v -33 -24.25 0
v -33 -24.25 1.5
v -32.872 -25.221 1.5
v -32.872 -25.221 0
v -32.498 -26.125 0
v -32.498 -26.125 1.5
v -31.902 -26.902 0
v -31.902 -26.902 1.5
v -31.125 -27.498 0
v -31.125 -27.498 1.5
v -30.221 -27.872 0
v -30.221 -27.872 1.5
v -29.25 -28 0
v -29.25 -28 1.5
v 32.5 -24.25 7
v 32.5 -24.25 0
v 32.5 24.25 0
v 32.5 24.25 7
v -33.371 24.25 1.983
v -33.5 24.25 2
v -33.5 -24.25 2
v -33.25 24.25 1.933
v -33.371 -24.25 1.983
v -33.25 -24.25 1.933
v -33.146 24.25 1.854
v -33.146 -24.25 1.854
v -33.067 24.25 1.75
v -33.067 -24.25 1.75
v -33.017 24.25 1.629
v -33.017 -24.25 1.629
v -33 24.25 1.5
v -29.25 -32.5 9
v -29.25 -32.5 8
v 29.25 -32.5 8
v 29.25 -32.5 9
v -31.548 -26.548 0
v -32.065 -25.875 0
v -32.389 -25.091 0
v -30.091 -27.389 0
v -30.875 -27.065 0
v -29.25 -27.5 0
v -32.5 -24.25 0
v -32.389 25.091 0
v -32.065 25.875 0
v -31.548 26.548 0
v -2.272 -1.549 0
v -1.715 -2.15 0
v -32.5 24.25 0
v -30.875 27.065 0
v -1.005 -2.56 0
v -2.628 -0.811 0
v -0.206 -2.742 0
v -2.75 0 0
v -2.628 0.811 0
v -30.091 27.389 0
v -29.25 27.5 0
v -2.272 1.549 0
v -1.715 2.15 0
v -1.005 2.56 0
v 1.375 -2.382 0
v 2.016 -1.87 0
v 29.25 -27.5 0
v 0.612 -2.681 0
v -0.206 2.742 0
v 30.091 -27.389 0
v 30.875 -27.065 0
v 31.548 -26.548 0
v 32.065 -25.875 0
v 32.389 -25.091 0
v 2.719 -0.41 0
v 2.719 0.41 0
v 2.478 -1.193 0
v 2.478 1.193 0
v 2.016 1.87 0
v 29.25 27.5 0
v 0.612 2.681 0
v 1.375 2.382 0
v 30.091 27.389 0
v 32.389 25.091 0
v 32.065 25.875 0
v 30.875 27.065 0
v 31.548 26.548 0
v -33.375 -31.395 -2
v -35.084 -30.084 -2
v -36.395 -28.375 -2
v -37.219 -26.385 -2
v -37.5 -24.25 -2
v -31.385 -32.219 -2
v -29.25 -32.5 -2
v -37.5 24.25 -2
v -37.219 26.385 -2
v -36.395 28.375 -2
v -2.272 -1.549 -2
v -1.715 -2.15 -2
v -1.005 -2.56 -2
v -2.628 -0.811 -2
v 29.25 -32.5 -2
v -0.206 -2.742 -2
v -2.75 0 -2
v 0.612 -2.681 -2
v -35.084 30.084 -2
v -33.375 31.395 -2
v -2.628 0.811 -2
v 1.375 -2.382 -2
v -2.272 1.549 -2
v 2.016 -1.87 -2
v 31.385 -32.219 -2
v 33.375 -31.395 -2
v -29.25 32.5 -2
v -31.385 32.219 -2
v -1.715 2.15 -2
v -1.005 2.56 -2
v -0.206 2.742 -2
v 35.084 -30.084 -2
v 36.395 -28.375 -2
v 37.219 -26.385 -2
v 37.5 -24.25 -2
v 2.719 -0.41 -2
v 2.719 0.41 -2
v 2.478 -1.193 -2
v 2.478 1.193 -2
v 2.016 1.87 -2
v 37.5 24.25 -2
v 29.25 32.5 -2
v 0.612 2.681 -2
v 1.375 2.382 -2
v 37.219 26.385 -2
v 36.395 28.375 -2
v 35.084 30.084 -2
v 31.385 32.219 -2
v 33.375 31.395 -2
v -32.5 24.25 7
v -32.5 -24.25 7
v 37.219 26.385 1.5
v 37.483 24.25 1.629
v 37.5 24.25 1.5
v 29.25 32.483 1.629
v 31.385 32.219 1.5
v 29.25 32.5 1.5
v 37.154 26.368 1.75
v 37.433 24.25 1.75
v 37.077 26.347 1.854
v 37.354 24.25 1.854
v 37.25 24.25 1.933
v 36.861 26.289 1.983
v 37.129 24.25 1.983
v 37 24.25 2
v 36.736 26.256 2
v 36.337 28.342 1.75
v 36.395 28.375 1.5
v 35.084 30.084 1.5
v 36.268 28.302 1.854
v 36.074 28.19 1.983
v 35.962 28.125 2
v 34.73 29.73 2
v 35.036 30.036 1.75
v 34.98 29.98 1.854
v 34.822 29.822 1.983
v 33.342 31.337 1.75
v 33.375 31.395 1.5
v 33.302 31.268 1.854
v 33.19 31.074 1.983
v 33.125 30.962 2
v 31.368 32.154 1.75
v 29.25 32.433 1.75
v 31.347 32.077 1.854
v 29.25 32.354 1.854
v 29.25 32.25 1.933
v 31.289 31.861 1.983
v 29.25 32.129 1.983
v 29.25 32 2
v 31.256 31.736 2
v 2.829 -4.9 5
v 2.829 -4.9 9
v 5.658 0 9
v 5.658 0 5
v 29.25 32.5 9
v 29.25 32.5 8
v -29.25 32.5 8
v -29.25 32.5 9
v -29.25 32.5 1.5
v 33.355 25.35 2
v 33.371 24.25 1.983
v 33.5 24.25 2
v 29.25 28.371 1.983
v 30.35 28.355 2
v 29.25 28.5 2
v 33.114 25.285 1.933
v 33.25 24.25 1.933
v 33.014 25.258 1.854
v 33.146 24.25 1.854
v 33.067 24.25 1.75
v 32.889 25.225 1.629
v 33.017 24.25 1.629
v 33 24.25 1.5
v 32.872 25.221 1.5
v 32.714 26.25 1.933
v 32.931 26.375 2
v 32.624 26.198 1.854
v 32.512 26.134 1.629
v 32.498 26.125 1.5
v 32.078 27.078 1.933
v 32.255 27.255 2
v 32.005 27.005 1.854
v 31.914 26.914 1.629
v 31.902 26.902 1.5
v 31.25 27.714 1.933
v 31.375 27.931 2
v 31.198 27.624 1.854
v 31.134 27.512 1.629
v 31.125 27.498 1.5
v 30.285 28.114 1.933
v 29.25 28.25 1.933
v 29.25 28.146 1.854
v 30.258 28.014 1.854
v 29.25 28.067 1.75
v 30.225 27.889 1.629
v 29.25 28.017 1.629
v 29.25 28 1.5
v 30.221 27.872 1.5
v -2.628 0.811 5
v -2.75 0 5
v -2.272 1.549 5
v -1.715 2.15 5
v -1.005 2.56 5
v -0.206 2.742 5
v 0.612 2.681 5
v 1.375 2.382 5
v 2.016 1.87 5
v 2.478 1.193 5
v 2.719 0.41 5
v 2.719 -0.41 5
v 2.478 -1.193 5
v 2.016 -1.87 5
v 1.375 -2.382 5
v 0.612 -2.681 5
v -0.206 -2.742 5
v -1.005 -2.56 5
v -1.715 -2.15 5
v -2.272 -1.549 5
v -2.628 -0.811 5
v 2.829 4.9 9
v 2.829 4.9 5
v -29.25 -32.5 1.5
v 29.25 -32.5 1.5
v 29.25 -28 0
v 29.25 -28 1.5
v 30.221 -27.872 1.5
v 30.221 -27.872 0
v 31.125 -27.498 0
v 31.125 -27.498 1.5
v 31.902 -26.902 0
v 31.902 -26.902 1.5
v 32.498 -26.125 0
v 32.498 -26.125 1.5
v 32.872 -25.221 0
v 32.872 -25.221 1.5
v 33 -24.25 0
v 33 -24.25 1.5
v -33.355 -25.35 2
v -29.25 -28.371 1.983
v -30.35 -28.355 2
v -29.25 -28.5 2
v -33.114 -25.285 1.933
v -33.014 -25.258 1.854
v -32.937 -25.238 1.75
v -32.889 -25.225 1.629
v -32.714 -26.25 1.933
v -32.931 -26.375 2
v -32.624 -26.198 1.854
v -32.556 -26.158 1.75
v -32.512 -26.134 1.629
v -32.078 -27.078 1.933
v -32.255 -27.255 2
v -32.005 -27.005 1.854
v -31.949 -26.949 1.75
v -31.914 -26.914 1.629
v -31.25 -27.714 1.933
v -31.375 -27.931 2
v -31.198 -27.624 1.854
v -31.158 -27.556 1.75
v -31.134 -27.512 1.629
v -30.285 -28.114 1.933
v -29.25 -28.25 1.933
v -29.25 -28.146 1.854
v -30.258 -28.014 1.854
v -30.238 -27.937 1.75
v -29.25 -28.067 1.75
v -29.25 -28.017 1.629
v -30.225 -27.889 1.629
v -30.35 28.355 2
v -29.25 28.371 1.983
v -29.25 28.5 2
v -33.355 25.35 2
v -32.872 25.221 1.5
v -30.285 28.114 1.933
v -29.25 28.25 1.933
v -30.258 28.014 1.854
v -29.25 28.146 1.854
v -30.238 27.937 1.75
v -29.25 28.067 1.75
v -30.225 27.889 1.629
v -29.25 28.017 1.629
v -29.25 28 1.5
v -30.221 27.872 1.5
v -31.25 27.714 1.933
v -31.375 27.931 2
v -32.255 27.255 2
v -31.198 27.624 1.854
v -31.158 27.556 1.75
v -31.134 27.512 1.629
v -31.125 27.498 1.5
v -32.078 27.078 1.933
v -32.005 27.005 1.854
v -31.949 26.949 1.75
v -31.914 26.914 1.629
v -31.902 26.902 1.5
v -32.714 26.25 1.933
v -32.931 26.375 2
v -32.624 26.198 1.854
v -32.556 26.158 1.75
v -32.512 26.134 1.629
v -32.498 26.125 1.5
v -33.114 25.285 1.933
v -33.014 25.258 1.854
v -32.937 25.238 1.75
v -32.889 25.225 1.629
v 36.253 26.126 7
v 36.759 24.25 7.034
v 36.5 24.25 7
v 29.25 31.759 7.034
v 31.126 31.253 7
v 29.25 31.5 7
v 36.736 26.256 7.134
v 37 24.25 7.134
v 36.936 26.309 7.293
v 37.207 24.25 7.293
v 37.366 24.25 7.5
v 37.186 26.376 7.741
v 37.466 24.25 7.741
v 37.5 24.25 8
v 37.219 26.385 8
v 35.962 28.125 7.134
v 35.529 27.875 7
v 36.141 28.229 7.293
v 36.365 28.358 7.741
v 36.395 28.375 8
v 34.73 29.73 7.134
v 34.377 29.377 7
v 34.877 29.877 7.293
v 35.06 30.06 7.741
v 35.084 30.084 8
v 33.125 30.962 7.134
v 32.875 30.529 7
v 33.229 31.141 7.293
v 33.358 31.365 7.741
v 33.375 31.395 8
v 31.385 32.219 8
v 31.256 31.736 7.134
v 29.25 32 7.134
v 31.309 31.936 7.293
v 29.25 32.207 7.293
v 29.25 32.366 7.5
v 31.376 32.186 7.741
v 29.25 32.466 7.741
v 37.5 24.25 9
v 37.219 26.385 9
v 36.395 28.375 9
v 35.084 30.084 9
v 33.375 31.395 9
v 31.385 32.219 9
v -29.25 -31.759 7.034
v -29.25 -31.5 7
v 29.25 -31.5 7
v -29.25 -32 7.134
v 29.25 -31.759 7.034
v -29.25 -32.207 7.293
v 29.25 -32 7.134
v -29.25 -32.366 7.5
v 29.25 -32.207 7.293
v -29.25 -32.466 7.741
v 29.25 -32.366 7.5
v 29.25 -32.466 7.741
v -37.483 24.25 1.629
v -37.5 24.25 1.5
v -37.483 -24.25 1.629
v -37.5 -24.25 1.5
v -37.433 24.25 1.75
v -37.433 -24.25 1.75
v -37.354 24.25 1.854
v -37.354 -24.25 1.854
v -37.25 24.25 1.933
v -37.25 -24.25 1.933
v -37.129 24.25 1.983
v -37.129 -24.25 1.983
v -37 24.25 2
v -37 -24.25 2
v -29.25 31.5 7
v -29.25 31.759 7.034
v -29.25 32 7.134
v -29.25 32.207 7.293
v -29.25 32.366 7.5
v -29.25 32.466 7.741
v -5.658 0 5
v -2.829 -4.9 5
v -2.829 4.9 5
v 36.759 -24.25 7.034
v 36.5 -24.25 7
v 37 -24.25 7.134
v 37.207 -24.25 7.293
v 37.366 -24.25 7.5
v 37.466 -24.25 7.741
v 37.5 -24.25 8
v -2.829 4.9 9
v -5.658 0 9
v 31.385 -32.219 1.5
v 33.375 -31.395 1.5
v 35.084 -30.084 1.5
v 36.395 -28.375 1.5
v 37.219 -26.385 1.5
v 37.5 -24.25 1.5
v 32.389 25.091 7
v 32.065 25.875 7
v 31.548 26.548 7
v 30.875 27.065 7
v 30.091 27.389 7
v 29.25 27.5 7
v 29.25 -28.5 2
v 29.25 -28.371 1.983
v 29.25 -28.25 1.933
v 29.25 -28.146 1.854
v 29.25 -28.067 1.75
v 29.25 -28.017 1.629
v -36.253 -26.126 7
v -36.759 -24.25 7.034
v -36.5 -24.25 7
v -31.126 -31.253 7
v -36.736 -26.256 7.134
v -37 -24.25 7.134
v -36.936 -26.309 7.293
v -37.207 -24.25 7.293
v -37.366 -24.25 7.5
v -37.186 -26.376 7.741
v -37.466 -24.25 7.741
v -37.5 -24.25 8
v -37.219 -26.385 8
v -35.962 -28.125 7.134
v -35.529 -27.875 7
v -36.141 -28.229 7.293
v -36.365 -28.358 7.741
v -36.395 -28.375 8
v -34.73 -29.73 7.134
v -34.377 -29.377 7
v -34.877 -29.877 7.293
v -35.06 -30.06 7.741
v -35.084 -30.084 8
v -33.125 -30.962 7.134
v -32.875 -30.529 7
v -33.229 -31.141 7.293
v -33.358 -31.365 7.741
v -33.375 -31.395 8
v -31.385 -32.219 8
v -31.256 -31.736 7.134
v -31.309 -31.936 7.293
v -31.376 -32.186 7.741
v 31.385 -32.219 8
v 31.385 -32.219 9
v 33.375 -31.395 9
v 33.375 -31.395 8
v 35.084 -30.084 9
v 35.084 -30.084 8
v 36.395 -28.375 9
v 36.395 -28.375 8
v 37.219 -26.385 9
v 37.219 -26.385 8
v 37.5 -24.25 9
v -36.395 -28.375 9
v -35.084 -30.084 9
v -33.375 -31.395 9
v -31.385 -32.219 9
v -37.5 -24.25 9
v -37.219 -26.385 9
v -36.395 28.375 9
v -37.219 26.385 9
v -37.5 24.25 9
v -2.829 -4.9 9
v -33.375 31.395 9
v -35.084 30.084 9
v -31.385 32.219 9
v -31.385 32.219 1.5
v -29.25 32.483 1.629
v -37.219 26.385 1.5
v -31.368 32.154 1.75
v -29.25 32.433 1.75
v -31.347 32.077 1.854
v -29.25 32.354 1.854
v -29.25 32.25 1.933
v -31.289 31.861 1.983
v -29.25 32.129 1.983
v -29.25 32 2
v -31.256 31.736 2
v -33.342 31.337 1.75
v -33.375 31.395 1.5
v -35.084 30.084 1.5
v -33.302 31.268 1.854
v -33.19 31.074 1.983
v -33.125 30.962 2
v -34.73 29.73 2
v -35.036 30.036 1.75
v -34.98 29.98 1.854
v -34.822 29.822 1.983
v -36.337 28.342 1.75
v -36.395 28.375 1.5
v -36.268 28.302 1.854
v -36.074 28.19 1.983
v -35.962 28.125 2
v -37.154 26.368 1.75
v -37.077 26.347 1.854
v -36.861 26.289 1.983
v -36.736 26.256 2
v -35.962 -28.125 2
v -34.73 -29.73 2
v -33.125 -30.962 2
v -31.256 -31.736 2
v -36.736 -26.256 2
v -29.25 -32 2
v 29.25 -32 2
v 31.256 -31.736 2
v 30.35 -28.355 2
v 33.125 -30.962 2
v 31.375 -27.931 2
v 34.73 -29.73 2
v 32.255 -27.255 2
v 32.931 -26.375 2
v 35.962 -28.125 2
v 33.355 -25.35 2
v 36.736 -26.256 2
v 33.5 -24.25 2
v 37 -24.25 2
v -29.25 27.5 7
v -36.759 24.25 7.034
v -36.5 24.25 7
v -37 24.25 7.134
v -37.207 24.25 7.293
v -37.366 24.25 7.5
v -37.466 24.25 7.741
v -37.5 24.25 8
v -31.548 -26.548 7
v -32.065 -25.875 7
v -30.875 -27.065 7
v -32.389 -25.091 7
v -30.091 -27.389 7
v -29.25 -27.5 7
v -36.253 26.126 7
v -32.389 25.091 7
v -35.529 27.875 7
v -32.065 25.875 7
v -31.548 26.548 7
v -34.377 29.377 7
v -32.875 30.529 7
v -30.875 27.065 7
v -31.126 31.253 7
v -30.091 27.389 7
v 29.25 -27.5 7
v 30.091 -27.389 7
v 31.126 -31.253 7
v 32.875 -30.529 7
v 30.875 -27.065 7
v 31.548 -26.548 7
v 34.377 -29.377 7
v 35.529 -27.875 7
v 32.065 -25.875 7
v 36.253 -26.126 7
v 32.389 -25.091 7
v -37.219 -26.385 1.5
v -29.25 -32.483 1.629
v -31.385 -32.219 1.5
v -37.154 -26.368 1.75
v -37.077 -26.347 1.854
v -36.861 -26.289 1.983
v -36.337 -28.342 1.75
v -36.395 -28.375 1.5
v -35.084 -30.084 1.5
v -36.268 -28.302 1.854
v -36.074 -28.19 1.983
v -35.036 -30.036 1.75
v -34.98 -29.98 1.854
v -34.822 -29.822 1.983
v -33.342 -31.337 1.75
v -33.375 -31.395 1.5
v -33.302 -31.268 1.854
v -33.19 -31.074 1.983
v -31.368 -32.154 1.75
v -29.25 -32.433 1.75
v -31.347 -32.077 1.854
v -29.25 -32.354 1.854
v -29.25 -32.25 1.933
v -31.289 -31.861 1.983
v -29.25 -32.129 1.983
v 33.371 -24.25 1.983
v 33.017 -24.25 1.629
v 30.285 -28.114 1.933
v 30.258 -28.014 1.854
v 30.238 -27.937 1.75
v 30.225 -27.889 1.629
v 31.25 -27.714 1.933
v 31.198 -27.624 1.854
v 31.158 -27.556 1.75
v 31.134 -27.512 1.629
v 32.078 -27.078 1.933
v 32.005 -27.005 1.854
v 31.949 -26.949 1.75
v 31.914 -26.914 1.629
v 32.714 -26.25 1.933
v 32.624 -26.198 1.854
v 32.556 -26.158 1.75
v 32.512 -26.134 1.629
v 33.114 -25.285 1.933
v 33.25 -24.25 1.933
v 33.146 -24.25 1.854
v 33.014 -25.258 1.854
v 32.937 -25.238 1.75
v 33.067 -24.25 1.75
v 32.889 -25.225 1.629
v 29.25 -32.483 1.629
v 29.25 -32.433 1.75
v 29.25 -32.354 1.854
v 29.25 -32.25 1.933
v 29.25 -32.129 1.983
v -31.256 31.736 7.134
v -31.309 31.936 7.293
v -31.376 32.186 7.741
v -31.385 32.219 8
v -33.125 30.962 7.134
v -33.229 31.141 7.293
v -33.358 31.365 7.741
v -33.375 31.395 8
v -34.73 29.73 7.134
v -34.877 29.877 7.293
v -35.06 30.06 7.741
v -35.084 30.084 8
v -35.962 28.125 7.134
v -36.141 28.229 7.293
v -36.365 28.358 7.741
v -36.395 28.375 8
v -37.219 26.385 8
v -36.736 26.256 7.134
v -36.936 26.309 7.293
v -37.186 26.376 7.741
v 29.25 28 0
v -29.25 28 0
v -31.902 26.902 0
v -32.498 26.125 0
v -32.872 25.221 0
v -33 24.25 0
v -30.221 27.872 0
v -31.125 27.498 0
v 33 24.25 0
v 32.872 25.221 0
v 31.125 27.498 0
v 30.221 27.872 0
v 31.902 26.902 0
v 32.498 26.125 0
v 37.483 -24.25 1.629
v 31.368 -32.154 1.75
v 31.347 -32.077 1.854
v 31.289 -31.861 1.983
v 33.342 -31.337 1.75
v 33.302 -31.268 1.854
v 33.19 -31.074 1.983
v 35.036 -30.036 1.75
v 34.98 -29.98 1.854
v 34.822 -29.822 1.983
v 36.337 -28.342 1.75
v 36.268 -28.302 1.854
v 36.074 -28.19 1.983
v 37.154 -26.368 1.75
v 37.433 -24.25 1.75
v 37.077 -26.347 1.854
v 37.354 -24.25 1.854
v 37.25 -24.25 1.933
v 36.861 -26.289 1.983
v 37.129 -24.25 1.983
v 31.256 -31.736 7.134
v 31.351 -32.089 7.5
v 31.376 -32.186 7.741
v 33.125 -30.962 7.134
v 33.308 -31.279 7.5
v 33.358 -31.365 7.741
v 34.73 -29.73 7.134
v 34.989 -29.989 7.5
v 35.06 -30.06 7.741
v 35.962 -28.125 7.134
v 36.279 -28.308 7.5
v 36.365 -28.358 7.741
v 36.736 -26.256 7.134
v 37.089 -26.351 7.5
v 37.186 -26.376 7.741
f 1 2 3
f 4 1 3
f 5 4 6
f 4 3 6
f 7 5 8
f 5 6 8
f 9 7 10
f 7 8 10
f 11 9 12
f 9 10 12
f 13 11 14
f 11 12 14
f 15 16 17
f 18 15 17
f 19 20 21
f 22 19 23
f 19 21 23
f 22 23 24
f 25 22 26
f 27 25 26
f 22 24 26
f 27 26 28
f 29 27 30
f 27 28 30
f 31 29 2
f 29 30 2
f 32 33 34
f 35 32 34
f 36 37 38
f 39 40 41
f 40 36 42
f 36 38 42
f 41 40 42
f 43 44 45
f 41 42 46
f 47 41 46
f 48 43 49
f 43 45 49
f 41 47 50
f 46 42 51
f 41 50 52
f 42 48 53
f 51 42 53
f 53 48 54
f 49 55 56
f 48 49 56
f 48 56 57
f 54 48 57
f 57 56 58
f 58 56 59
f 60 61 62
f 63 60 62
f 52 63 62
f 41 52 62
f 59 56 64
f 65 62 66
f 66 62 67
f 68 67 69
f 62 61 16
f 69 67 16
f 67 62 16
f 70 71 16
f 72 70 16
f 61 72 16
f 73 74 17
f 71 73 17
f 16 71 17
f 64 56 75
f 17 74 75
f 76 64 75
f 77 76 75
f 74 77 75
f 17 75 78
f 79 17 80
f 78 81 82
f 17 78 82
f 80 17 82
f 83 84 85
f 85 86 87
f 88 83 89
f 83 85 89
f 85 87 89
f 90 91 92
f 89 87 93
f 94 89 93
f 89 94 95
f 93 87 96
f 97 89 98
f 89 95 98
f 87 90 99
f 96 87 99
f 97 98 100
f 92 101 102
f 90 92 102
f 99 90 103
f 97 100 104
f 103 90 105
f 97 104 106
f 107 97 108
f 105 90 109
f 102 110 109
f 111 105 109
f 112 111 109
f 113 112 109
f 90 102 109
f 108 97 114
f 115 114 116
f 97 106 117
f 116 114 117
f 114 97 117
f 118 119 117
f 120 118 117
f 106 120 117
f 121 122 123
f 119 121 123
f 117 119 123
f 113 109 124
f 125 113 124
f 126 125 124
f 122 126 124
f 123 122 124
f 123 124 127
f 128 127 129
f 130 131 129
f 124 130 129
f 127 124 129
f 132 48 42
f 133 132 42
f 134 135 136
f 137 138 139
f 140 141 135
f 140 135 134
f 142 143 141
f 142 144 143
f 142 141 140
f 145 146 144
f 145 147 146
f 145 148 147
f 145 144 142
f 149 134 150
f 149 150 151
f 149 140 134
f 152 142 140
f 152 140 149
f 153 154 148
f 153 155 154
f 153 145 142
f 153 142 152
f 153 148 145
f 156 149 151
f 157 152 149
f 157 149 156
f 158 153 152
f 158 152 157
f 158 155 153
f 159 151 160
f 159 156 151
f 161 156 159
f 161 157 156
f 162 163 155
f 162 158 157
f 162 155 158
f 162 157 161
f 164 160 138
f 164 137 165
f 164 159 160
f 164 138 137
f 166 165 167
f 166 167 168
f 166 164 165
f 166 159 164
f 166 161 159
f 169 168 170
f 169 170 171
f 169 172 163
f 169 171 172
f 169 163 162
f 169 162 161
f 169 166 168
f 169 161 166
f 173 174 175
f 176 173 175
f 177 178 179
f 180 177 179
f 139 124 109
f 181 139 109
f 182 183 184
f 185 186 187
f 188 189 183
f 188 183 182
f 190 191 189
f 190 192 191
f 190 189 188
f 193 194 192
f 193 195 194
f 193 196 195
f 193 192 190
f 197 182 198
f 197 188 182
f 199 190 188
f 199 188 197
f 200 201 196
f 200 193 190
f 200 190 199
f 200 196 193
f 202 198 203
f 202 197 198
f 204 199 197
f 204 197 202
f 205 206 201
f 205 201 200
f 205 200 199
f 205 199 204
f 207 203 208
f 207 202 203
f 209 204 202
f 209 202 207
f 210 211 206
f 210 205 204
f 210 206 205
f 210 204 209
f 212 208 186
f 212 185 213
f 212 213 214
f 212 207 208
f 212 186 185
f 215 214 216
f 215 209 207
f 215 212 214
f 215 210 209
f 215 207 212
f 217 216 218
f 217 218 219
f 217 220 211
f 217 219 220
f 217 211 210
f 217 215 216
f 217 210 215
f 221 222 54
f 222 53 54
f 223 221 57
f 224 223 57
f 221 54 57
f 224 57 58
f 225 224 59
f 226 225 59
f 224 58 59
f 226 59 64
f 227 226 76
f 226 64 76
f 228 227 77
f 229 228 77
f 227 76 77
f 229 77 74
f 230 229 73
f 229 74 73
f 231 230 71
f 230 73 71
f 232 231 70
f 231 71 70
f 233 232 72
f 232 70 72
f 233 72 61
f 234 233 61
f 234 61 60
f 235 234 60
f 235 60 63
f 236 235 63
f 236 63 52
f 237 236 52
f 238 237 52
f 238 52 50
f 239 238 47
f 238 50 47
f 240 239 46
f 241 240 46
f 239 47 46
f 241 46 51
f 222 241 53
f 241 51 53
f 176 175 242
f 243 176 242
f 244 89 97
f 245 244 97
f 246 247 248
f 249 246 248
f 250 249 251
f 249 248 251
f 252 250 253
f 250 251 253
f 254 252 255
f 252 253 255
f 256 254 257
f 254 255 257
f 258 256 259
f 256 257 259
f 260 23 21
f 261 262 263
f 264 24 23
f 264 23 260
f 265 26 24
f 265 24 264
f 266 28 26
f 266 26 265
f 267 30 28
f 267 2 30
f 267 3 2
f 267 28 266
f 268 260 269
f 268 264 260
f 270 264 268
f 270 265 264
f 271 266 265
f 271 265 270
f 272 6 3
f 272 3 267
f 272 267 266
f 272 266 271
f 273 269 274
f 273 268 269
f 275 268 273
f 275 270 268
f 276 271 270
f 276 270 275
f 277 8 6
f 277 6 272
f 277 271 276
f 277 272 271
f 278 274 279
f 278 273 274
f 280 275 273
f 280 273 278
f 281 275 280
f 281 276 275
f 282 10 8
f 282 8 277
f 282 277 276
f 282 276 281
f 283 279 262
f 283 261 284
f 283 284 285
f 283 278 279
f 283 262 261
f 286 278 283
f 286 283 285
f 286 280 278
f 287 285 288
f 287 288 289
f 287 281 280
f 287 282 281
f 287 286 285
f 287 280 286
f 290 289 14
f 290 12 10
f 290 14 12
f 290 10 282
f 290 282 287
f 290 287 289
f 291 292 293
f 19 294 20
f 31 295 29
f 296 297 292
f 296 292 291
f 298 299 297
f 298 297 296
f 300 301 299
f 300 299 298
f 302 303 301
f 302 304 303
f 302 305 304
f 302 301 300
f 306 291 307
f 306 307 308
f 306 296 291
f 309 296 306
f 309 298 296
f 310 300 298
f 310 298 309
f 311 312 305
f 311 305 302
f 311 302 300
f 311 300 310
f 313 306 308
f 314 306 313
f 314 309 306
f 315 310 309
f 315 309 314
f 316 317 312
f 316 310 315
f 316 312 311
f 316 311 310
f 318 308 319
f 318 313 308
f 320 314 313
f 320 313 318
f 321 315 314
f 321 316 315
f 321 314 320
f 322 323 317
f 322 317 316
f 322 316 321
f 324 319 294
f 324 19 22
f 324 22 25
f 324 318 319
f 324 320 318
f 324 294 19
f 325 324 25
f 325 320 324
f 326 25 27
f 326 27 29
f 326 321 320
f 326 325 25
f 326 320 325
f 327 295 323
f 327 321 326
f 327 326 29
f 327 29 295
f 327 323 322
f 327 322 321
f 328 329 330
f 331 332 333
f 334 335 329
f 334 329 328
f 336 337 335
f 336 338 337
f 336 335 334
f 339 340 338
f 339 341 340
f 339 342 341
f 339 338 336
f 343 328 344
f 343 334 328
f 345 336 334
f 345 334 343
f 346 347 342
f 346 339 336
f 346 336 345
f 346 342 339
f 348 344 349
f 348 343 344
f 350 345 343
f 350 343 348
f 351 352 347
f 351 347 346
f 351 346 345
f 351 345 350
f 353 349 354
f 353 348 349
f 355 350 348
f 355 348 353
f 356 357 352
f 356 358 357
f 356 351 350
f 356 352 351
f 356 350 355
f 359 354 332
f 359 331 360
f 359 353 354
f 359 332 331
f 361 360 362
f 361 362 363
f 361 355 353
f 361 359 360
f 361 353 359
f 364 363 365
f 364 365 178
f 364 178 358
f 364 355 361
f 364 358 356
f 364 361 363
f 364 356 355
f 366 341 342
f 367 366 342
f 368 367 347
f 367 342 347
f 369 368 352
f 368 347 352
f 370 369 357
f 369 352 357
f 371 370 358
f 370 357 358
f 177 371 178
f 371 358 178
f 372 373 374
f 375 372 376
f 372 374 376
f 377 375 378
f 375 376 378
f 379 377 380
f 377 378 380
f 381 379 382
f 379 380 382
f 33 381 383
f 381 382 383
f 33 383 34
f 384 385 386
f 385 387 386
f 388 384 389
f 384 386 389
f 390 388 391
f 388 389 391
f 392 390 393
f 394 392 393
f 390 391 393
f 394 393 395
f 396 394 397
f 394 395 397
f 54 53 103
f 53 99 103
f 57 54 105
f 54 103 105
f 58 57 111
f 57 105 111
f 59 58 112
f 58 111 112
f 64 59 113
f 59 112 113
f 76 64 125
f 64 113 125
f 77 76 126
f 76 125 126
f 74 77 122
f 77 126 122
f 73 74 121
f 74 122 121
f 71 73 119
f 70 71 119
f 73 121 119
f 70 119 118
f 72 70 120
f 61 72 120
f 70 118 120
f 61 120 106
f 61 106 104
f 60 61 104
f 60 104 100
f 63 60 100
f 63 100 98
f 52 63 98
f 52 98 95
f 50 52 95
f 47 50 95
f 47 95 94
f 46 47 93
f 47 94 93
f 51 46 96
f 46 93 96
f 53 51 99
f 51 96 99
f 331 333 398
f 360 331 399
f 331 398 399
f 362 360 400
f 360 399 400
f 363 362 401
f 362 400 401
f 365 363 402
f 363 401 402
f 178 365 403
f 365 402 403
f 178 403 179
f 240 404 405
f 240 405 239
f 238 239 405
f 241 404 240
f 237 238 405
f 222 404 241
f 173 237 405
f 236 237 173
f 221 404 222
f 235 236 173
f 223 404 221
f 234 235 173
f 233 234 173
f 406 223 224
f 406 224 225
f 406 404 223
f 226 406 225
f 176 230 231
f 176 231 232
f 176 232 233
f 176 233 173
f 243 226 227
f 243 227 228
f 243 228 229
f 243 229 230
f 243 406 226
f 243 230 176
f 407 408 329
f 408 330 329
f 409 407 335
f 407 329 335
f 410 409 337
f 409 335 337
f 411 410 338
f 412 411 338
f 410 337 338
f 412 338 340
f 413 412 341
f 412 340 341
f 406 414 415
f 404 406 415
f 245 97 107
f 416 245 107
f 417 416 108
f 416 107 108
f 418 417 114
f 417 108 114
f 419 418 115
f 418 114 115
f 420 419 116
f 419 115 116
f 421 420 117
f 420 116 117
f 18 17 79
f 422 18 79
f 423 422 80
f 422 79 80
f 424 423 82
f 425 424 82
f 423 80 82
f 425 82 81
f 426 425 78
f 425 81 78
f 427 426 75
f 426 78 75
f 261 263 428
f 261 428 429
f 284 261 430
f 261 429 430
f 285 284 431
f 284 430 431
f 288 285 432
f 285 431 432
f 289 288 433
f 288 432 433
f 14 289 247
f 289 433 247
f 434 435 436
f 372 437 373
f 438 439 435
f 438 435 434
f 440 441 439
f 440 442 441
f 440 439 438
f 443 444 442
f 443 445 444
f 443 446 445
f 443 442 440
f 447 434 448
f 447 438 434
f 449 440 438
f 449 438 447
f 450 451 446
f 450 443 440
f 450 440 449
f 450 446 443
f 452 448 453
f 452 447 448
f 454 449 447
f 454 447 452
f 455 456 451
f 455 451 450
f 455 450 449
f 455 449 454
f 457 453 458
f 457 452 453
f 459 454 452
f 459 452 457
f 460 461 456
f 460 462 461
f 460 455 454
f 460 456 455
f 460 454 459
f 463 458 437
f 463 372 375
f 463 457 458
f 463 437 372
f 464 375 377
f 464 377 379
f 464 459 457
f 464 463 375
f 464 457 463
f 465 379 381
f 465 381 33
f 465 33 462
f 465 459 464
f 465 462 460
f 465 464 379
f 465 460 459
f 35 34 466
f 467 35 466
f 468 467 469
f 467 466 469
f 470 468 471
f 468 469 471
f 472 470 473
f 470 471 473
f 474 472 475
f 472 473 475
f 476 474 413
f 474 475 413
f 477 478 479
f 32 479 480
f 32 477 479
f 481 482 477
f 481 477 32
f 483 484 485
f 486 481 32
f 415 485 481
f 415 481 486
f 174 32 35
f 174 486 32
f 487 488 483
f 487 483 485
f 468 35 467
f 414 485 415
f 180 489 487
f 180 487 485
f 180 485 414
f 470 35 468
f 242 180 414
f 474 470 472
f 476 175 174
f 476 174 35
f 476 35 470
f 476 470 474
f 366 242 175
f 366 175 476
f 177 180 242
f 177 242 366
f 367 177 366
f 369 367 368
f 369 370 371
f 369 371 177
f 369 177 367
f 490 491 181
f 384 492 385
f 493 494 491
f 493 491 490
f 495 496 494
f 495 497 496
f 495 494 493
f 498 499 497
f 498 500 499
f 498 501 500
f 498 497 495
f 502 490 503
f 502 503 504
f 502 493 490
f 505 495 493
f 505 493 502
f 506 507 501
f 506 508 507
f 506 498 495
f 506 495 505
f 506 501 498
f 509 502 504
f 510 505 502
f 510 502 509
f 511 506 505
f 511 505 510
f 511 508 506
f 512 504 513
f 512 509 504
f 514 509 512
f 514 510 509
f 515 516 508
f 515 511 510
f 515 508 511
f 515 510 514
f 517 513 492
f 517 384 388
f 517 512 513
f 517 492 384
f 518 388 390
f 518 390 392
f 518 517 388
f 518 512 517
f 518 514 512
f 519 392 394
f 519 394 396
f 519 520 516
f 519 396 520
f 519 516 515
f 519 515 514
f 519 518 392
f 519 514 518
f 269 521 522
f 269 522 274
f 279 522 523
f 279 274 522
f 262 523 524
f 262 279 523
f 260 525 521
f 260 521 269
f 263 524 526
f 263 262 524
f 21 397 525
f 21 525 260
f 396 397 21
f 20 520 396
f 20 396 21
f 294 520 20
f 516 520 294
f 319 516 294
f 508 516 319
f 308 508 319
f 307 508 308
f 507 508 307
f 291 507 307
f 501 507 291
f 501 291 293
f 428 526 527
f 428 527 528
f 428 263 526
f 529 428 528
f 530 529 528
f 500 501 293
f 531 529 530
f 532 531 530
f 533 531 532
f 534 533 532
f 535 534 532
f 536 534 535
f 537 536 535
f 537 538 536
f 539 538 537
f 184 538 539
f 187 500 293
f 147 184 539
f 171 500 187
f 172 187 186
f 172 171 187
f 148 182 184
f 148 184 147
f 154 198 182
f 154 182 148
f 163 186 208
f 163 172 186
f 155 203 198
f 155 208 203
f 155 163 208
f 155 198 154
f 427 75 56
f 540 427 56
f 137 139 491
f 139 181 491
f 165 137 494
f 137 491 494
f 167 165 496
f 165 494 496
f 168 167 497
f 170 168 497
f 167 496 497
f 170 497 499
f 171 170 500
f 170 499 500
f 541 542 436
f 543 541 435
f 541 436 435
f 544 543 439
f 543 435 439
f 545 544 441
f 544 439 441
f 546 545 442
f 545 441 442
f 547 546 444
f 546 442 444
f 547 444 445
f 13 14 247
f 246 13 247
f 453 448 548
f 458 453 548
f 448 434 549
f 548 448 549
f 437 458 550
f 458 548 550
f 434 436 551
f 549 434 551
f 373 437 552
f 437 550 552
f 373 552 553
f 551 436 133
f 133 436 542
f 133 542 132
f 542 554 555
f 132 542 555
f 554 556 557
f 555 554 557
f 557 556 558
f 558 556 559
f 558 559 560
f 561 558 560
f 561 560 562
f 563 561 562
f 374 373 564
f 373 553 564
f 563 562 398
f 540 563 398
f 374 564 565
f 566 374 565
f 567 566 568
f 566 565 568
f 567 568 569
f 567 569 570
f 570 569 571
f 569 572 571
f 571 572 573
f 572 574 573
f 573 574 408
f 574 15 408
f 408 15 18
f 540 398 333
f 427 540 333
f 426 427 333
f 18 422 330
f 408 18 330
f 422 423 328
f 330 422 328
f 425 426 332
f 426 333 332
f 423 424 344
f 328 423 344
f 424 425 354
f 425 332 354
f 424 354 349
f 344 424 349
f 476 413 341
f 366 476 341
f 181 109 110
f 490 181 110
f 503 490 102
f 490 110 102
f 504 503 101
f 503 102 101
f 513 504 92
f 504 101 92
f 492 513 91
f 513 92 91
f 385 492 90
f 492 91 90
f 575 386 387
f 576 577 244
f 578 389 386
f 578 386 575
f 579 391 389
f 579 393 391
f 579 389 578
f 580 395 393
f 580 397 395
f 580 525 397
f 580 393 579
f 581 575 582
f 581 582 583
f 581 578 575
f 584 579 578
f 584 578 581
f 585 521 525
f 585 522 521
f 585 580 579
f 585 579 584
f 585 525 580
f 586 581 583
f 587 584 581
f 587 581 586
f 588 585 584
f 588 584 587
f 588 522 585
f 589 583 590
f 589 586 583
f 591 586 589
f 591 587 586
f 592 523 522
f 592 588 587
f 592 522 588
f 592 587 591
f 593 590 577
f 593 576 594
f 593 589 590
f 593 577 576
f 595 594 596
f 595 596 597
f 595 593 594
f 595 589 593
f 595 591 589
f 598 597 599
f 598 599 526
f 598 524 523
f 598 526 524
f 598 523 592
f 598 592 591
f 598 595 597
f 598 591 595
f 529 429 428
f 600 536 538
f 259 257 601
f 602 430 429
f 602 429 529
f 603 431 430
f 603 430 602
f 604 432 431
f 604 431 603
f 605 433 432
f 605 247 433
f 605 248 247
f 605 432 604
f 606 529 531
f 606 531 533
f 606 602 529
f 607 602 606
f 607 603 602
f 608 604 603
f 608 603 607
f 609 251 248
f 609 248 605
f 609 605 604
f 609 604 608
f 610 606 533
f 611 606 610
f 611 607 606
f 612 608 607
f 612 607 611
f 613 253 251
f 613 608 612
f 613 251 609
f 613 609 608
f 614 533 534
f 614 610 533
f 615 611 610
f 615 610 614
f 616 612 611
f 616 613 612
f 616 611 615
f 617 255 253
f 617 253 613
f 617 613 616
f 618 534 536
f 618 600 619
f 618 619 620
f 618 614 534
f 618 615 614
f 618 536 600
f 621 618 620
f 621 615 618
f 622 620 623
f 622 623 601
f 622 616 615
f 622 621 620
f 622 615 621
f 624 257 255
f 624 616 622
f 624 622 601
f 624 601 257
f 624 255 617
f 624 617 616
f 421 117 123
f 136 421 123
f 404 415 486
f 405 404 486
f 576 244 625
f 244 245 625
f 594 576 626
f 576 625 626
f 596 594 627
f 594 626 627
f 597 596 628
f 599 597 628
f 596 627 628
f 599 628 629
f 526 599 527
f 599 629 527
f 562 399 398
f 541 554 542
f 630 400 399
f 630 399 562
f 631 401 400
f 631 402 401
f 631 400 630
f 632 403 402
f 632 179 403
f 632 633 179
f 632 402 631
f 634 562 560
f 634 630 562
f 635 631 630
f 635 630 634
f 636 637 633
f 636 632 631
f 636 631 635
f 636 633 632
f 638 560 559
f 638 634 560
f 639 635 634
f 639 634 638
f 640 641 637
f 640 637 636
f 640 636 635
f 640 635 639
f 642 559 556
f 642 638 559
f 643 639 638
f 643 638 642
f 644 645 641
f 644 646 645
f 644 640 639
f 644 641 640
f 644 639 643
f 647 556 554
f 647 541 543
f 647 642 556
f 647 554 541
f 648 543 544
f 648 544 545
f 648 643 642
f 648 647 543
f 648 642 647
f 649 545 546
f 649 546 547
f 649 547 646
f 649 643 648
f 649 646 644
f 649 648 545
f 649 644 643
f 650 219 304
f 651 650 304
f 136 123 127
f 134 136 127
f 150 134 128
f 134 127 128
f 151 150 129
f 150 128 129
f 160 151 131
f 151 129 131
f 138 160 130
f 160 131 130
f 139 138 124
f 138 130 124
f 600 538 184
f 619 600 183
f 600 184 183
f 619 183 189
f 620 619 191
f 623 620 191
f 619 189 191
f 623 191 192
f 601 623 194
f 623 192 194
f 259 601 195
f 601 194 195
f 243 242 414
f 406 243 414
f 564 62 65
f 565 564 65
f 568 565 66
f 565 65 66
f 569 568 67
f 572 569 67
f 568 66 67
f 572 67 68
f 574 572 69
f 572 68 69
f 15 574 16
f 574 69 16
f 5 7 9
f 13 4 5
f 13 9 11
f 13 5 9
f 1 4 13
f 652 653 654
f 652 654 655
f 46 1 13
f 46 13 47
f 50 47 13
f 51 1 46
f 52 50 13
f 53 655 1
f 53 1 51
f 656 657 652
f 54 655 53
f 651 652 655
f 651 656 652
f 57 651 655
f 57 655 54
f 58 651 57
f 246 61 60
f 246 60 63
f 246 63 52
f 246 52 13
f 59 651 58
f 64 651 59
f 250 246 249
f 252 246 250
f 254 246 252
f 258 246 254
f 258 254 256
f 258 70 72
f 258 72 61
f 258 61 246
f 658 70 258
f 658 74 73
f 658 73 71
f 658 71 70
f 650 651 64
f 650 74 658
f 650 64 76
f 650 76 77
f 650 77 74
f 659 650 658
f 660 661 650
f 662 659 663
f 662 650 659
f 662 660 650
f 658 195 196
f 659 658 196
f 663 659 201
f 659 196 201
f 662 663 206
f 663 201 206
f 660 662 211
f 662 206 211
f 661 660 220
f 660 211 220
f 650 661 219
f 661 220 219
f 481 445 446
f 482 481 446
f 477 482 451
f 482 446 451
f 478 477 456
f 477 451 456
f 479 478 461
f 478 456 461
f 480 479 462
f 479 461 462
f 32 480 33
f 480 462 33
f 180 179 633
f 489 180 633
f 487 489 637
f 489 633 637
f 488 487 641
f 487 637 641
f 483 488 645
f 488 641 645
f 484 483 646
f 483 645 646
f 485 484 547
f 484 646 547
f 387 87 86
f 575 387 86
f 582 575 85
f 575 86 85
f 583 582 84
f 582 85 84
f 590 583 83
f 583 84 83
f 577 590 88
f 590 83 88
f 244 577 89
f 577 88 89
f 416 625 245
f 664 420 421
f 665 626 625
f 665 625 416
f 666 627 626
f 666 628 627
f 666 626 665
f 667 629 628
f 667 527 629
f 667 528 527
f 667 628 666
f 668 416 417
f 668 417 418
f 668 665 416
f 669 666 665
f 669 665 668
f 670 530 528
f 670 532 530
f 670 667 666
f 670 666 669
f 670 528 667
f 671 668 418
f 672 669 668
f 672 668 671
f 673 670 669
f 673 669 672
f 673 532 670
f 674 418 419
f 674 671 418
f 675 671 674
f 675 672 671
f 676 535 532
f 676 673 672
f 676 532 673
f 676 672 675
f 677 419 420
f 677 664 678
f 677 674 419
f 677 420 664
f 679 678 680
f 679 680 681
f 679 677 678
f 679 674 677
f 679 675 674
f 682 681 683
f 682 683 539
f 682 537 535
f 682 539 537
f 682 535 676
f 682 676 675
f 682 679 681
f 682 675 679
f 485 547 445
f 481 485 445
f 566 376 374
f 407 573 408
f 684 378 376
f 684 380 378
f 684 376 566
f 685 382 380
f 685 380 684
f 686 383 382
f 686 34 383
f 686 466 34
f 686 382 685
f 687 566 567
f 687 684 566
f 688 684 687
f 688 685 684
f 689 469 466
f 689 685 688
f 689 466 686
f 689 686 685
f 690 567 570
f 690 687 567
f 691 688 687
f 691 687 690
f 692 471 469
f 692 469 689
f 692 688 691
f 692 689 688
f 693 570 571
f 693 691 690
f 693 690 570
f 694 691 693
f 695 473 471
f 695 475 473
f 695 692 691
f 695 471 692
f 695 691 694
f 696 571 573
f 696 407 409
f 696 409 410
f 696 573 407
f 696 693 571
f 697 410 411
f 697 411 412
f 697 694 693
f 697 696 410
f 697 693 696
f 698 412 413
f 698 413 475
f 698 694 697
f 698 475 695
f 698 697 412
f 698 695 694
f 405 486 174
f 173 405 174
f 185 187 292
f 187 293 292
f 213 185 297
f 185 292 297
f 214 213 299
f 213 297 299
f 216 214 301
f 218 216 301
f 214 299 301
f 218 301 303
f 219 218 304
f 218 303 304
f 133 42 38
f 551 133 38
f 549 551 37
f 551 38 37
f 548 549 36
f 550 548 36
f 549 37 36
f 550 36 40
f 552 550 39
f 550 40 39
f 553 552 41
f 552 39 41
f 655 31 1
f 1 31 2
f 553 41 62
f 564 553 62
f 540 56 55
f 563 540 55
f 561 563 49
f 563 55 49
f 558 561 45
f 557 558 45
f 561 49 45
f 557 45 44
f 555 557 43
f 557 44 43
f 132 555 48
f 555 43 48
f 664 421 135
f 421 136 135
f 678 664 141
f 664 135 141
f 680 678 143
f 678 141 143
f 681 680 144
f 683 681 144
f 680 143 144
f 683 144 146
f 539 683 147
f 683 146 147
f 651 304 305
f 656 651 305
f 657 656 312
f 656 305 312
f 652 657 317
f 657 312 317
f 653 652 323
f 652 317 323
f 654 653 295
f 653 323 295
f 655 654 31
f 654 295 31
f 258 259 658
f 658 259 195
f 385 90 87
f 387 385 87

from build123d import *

# Parameters (mm, degrees)
F1_DEPTH          = 7
F3_DEPTH          = 2
F4_DEPTH          = 4
F7_DEPTH          = 2
F8_R              = 0.5
F10_D             = 5.5
F10_CBORE_D       = 6.5
F10_CBORE_DEPTH   = 3
F10_2_D           = 5.5
F10_2_CBORE_D     = 6.5
F10_2_CBORE_DEPTH = 3
F11_DEPTH         = 4
F12_R             = 1


with BuildPart() as f1:
    # F0 (on Top) → F1 (new body)
    with BuildSketch(Plane.XY):
        with BuildLine():
            Line((29.25, 27.5), (-29.25, 27.5))
            ThreePointArc((-29.25, 27.5), (-31.5480970389, 26.5480970389), (-32.5, 24.25))
            Line((-32.5, 24.25), (-32.5, -24.25))
            ThreePointArc((-32.5, -24.25), (-31.5480970389, -26.5480970389), (-29.25, -27.5))
            Line((-29.25, -27.5), (29.25, -27.5))
            ThreePointArc((29.25, -27.5), (31.5480970389, -26.5480970389), (32.5, -24.25))
            Line((32.5, -24.25), (32.5, 24.25))
            ThreePointArc((32.5, 24.25), (31.5480970389, 26.5480970389), (29.25, 27.5))
        make_face()
    extrude(amount=F1_DEPTH)

    # F2 (on face) → F3 (join)
    with BuildSketch(Plane.XY.offset(7)):
        with BuildLine():
            Line((29.25, 32.5), (-29.25, 32.5))
            ThreePointArc((-29.25, 32.5), (-35.0836309448, 30.0836309448), (-37.5, 24.25))
            Line((-37.5, 24.25), (-37.5, -24.25))
            ThreePointArc((-37.5, -24.25), (-35.0836309448, -30.0836309448), (-29.25, -32.5))
            Line((-29.25, -32.5), (29.25, -32.5))
            ThreePointArc((29.25, -32.5), (35.0836309448, -30.0836309448), (37.5, -24.25))
            Line((37.5, -24.25), (37.5, 24.25))
            ThreePointArc((37.5, 24.25), (35.0836309448, 30.0836309448), (29.25, 32.5))
        make_face()
    extrude(amount=F3_DEPTH)

    # F10 (through all)
    with Locations(Plane.XY.offset(9)):
        with Locations((0, 0)):
            CounterBoreHole(F10_D / 2, F10_CBORE_D / 2, F10_CBORE_DEPTH)

    # F9 (on face) → F11 (cut)
    with BuildSketch(Plane.XY.offset(9)):
        Polygon((-2.829016319, -4.9), (2.829016319, -4.9), (5.6580326381, 0), (2.829016319, 4.9), (-2.829016319, 4.9), (-5.6580326381, 0), align=None)
    extrude(amount=-F11_DEPTH, mode=Mode.SUBTRACT)

    # F12
    f12_edges = [f1.edges().sort_by_distance(p)[0] for p in [
        (37.5, 0, 7),
        (35.083631, -30.083631, 7),
        (0, -32.5, 7),
        (-35.083631, -30.083631, 7),
        (-37.5, 0, 7),
        (-35.083631, 30.083631, 7),
        (0, 32.5, 7),
        (35.083631, 30.083631, 7),
    ]]
    fillet(f12_edges, radius=F12_R)


with BuildPart() as f4:
    # F2 (on face) → F4 (new body)
    with BuildSketch(Plane.XY.offset(7)):
        with BuildLine():
            Line((29.25, 32.5), (-29.25, 32.5))
            ThreePointArc((-29.25, 32.5), (-35.0836309448, 30.0836309448), (-37.5, 24.25))
            Line((-37.5, 24.25), (-37.5, -24.25))
            ThreePointArc((-37.5, -24.25), (-35.0836309448, -30.0836309448), (-29.25, -32.5))
            Line((-29.25, -32.5), (29.25, -32.5))
            ThreePointArc((29.25, -32.5), (35.0836309448, -30.0836309448), (37.5, -24.25))
            Line((37.5, -24.25), (37.5, 24.25))
            ThreePointArc((37.5, 24.25), (35.0836309448, 30.0836309448), (29.25, 32.5))
        make_face()
    extrude(amount=F4_DEPTH)


with BuildPart() as f4_1:
    # F5: moved
    add(f4.part.moved(Location((0, 0, -9))))

    # F6 (on face) → F7 (cut)
    with BuildSketch(Plane.XY.offset(2)):
        with BuildLine():
            Line((29.25, 28), (-29.25, 28))
            ThreePointArc((-29.25, 28), (-31.9016504294, 26.9016504294), (-33, 24.25))
            Line((-33, 24.25), (-33, -24.25))
            ThreePointArc((-33, -24.25), (-31.9016504294, -26.9016504294), (-29.25, -28))
            Line((-29.25, -28), (29.25, -28))
            ThreePointArc((29.25, -28), (31.9016504294, -26.9016504294), (33, -24.25))
            Line((33, -24.25), (33, 24.25))
            ThreePointArc((33, 24.25), (31.9016504294, 26.9016504294), (29.25, 28))
        make_face()
    extrude(amount=-F7_DEPTH, mode=Mode.SUBTRACT)

    # F8
    f8_edges = [f4_1.edges().sort_by_distance(p)[0] for p in [
        (0, 32.5, 2),
        (35.083631, 30.083631, 2),
        (-35.083631, 30.083631, 2),
        (37.5, 0, 2),
        (-37.5, 0, 2),
        (35.083631, -30.083631, 2),
        (-35.083631, -30.083631, 2),
        (0, -32.5, 2),
        (0, 28, 2),
        (-31.90165, 26.90165, 2),
        (-33, 0, 2),
        (-31.90165, -26.90165, 2),
        (0, -28, 2),
        (31.90165, -26.90165, 2),
        (33, 0, 2),
        (31.90165, 26.90165, 2),
    ]]
    fillet(f8_edges, radius=F8_R)

    # F10#2 (through all)
    with Locations(Plane.XY.offset(9)):
        with Locations((0, 0)):
            CounterBoreHole(F10_2_D / 2, F10_2_CBORE_D / 2, F10_2_CBORE_DEPTH)


solid = Compound([f1.part, f4_1.part])
